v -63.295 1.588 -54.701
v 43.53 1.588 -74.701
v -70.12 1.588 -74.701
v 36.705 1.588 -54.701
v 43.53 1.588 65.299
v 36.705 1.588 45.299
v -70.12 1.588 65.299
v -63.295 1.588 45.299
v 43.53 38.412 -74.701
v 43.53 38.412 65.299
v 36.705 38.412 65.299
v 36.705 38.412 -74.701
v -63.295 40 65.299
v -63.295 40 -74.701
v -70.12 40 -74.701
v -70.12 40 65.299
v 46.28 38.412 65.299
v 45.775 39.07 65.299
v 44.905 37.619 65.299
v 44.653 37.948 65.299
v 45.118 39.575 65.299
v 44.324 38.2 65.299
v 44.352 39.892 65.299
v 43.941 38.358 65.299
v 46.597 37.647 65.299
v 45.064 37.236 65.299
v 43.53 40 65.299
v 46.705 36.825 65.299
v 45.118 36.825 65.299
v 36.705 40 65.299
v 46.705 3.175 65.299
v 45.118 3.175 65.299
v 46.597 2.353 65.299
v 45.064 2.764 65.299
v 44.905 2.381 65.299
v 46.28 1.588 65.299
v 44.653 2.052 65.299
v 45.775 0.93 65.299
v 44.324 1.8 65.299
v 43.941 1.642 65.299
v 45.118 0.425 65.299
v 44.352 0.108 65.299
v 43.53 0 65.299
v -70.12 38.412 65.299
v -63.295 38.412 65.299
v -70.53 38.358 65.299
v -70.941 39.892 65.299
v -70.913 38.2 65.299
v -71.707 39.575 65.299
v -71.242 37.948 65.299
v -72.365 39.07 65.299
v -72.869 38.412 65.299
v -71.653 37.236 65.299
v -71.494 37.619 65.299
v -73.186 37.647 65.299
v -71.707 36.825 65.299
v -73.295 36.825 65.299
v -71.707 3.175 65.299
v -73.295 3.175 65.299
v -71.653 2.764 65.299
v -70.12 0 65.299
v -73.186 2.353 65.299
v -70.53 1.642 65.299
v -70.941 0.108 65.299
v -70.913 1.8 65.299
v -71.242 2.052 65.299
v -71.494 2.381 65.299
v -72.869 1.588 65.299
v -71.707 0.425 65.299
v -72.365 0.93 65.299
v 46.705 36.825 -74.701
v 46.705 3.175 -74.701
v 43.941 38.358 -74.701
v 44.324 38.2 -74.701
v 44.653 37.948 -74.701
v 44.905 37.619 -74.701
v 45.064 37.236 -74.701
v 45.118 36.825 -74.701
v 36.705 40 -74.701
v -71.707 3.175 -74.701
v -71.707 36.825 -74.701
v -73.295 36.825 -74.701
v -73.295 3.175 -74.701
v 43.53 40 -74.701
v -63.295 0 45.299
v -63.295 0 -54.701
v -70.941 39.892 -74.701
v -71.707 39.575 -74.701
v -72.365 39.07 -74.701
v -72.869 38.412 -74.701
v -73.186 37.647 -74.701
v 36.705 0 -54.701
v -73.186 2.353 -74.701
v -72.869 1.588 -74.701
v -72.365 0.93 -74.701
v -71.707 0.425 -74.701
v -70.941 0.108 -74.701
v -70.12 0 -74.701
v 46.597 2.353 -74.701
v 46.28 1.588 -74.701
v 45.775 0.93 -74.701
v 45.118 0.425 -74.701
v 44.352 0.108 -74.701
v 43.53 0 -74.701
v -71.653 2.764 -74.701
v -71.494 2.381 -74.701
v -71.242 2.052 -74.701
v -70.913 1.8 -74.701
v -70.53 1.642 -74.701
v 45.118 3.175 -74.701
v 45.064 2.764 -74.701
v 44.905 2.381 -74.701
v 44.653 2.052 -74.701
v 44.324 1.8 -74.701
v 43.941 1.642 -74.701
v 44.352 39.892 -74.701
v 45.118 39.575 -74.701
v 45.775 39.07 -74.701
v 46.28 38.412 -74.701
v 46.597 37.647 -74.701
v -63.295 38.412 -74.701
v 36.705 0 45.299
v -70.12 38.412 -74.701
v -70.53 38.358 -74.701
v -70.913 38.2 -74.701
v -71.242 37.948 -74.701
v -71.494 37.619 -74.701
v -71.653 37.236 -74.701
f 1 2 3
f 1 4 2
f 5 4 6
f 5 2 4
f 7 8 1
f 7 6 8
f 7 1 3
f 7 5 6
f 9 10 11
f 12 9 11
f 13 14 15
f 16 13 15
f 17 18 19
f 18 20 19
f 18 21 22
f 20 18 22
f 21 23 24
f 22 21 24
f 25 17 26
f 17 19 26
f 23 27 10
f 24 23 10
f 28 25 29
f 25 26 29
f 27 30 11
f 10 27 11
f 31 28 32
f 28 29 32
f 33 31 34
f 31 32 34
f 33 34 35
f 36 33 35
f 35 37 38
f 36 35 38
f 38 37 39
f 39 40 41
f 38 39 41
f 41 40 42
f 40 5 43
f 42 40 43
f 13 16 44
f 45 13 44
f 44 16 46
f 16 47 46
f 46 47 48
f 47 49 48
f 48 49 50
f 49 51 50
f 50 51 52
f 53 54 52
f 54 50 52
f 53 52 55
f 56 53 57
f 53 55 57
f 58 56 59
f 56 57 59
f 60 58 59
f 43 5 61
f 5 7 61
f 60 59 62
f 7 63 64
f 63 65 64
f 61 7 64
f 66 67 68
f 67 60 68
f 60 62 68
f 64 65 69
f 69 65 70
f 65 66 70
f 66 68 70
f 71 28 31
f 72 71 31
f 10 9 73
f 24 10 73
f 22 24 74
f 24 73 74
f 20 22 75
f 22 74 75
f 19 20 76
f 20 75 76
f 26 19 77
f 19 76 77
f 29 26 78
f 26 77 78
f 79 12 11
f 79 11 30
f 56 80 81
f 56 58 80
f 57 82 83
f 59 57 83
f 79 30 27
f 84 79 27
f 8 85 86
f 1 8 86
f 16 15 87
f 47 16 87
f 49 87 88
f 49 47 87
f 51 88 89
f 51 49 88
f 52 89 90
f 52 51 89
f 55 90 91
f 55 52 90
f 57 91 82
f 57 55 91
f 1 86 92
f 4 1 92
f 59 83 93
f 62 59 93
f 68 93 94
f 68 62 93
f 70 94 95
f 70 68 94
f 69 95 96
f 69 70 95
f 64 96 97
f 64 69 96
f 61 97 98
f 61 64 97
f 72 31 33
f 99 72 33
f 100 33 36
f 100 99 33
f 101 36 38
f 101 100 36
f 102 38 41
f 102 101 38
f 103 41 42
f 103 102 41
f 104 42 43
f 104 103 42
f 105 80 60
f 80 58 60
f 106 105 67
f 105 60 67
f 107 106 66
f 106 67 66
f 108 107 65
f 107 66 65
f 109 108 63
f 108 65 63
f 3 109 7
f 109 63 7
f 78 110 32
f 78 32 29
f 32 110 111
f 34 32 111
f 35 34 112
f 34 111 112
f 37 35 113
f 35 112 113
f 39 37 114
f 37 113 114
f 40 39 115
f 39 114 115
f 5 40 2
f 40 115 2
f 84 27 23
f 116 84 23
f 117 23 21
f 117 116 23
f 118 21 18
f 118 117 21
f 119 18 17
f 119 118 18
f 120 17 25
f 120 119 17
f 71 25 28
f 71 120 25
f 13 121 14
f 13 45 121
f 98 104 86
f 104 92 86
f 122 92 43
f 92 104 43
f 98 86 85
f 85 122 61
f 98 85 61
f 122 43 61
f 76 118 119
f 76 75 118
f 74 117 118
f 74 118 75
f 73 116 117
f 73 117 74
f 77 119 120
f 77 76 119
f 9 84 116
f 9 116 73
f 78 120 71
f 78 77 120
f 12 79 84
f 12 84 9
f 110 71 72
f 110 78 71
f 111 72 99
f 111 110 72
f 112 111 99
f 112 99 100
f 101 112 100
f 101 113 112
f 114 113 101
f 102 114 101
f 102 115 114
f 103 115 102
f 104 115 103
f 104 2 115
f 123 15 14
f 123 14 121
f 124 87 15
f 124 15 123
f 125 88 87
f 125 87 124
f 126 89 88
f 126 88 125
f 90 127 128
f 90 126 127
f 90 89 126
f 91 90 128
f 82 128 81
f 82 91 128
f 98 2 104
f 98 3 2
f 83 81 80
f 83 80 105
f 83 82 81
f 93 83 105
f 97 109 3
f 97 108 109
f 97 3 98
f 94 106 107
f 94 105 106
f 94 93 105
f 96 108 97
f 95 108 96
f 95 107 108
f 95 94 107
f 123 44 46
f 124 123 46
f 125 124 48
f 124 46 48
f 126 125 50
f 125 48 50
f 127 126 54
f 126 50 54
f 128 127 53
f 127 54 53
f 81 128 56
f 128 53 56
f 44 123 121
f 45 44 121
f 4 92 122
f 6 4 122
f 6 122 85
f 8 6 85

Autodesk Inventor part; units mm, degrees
ref_plane "YZ Plane" through (0, 0, 0) normal (1, 0, 0) x (0, 1, 0)
ref_plane "XZ Plane" through (0, 0, 0) normal (0, 1, 0) x (-1, 0, 0)
ref_plane "XY Plane" through (0, 0, 0) normal (0, 0, 1) x (1, 0, 0)
sketch "Sketch1" plane through (0, 0, 0) normal (0, 1, 0) x (-1, 0, 0)
  line L0 (-36.7054, 45.2992) -> (63.2946, 45.2992)
  line L1 (63.2946, 45.2992) -> (63.2946, -54.7008)
  line L2 (63.2946, -54.7008) -> (-36.7054, -54.7008)
  line L3 (-36.7054, -54.7008) -> (-36.7054, 45.2992)
  line L4 (73.2946, -74.7008) -> (-46.7054, -74.7008)
  line L5 (-46.7054, -74.7008) -> (-46.7054, 65.2992)
  line L6 (-46.7054, 65.2992) -> (73.2946, 65.2992)
  line L7 (73.2946, 65.2992) -> (73.2946, -74.7008)
  point P0 (0, 0)
  dimension "d0" = 100
  dimension "d1" = 100
  dimension "d2" = 120
  dimension "d3" = 140
  dimension "d4" = 20
  dimension "d5" = 10
extrude "Plate1" add sketch "Sketch1" along normal blind 1.5875
sketch "Sketch2" plane through (45.1179, 0, -74.7008) normal (1, 0, 0) x (0, 1, 0)
  line L0 (0, 140) -> (0, 0)
  line L1 (0, 0) -> (40, 0)
  line L2 (40, 0) -> (40, 140)
  line L3 (40, 140) -> (0, 140)
edge flange "Flange1" height 40 angle 90 thickness 1.5875 bend radius 1.5875 thickness toward (1, 0, 0) relief tear relief width 1.5875 relief depth 0.7937 edges at (46.7054, 1.5875, -4.7008) wall of the first edge with corners at (45.1179, 0, 65.2992) (45.1179, 0, -74.7008) (45.1179, 40, -74.7008) (45.1179, 40, 65.2992)
bend "Bend1"
corner "Corner1"
sketch "Sketch3" plane through (-71.7071, 0, 65.2992) normal (-1, 0, 0) x (0, -1, 0)
  line L0 (0, -140) -> (0, 0)
  line L1 (0, 0) -> (-40, 0)
  line L2 (-40, 0) -> (-40, -140)
  line L3 (-40, -140) -> (0, -140)
edge flange "Flange2" height 40 angle 90 thickness 1.5875 bend radius 1.5875 thickness toward (-1, 0, 0) relief tear relief width 1.5875 relief depth 0.7937 edges at (-73.2946, 1.5875, -4.7008) wall of the first edge with corners at (-71.7071, 0, -74.7008) (-71.7071, 0, 65.2992) (-71.7071, 40, 65.2992) (-71.7071, 40, -74.7008)
bend "Bend2"
corner "Corner2"
sketch "Sketch4" plane through (-73.2946, 38.4125, 65.2992) normal (0, 1, 0) x (-1, 0, 0)
  line L0 (0, -140) -> (0, 0)
  line L1 (0, 0) -> (-10, 0)
  line L2 (-10, 0) -> (-10, -140)
  line L3 (-10, -140) -> (0, -140)
edge flange "Flange3" height 10 angle 90 thickness 1.5875 bend radius 1.5875 thickness toward (0, 1, 0) relief tear relief width 1.5875 relief depth 0.7937 edges at (-71.7071, 40, -4.7008) wall of the first edge with corners at (-73.2946, 38.4125, -74.7008) (-73.2946, 38.4125, 65.2992) (-63.2946, 38.4125, 65.2992) (-63.2946, 38.4125, -74.7008)
bend "Bend3"
corner "Corner3"
sketch "Sketch5" plane through (46.7054, 38.4125, -74.7008) normal (0, 1, 0) x (-1, 0, 0)
  line L0 (0, 140) -> (0, 0)
  line L1 (0, 0) -> (10, 0)
  line L2 (10, 0) -> (10, 140)
  line L3 (10, 140) -> (0, 140)
edge flange "Flange4" height 10 angle 90 thickness 1.5875 bend radius 1.5875 thickness toward (0, 1, 0) relief tear relief width 1.5875 relief depth 0.7937 edges at (45.1179, 40, -4.7008) wall of the first edge with corners at (46.7054, 38.4125, 65.2992) (46.7054, 38.4125, -74.7008) (36.7054, 38.4125, -74.7008) (36.7054, 38.4125, 65.2992)
bend "Bend4"
corner "Corner4"
equation "\"d7\" = BendReliefWidth"
equation "\"d8\" = BendReliefDepth"
equation "\"d9\" = MinimumRemnant"
equation "\"d10\" = BendRadius"
equation "\"d13\" = BendRadius"
equation "\"d14\" = CornerReliefSize"
equation "\"d15\" = GapSize"
equation "\"d16\" = JacobiRadiusSize"
equation "\"d17\" = BendReliefWidth"
equation "\"d18\" = BendReliefDepth"
equation "\"d19\" = MinimumRemnant"
equation "\"d20\" = BendRadius"
equation "\"d23\" = BendRadius"
equation "\"d24\" = CornerReliefSize"
equation "\"d25\" = GapSize"
equation "\"d26\" = JacobiRadiusSize"
equation "\"d27\" = BendReliefWidth"
equation "\"d28\" = BendReliefDepth"
equation "\"d29\" = MinimumRemnant"
equation "\"d30\" = BendRadius"
equation "\"d33\" = BendRadius"
equation "\"d34\" = CornerReliefSize"
equation "\"d35\" = GapSize"
equation "\"d36\" = JacobiRadiusSize"
equation "\"d37\" = BendReliefWidth"
equation "\"d38\" = BendReliefDepth"
equation "\"d39\" = MinimumRemnant"
equation "\"d40\" = BendRadius"
equation "\"d43\" = BendRadius"
equation "\"d44\" = CornerReliefSize"
equation "\"d45\" = GapSize"
equation "\"d46\" = JacobiRadiusSize"
equation "\"BendRadius\" = Thickness"
equation "\"BendReliefWidth\" = Thickness"
equation "\"BendReliefDepth\" = 0.5 * Thickness"
equation "\"CornerReliefSize\" = 4 * Thickness"
equation "\"MinimumRemnant\" = 2 * Thickness"
equation "\"TransitionRadius\" = BendRadius"
equation "\"JacobiRadiusSize\" = BendRadius"
equation "\"GapSize\" = Thickness"
equation "\"d6\" = BendRadius"
equation "\"Thickness\" = 1.5875"
properties part number "DishFanMetal"
